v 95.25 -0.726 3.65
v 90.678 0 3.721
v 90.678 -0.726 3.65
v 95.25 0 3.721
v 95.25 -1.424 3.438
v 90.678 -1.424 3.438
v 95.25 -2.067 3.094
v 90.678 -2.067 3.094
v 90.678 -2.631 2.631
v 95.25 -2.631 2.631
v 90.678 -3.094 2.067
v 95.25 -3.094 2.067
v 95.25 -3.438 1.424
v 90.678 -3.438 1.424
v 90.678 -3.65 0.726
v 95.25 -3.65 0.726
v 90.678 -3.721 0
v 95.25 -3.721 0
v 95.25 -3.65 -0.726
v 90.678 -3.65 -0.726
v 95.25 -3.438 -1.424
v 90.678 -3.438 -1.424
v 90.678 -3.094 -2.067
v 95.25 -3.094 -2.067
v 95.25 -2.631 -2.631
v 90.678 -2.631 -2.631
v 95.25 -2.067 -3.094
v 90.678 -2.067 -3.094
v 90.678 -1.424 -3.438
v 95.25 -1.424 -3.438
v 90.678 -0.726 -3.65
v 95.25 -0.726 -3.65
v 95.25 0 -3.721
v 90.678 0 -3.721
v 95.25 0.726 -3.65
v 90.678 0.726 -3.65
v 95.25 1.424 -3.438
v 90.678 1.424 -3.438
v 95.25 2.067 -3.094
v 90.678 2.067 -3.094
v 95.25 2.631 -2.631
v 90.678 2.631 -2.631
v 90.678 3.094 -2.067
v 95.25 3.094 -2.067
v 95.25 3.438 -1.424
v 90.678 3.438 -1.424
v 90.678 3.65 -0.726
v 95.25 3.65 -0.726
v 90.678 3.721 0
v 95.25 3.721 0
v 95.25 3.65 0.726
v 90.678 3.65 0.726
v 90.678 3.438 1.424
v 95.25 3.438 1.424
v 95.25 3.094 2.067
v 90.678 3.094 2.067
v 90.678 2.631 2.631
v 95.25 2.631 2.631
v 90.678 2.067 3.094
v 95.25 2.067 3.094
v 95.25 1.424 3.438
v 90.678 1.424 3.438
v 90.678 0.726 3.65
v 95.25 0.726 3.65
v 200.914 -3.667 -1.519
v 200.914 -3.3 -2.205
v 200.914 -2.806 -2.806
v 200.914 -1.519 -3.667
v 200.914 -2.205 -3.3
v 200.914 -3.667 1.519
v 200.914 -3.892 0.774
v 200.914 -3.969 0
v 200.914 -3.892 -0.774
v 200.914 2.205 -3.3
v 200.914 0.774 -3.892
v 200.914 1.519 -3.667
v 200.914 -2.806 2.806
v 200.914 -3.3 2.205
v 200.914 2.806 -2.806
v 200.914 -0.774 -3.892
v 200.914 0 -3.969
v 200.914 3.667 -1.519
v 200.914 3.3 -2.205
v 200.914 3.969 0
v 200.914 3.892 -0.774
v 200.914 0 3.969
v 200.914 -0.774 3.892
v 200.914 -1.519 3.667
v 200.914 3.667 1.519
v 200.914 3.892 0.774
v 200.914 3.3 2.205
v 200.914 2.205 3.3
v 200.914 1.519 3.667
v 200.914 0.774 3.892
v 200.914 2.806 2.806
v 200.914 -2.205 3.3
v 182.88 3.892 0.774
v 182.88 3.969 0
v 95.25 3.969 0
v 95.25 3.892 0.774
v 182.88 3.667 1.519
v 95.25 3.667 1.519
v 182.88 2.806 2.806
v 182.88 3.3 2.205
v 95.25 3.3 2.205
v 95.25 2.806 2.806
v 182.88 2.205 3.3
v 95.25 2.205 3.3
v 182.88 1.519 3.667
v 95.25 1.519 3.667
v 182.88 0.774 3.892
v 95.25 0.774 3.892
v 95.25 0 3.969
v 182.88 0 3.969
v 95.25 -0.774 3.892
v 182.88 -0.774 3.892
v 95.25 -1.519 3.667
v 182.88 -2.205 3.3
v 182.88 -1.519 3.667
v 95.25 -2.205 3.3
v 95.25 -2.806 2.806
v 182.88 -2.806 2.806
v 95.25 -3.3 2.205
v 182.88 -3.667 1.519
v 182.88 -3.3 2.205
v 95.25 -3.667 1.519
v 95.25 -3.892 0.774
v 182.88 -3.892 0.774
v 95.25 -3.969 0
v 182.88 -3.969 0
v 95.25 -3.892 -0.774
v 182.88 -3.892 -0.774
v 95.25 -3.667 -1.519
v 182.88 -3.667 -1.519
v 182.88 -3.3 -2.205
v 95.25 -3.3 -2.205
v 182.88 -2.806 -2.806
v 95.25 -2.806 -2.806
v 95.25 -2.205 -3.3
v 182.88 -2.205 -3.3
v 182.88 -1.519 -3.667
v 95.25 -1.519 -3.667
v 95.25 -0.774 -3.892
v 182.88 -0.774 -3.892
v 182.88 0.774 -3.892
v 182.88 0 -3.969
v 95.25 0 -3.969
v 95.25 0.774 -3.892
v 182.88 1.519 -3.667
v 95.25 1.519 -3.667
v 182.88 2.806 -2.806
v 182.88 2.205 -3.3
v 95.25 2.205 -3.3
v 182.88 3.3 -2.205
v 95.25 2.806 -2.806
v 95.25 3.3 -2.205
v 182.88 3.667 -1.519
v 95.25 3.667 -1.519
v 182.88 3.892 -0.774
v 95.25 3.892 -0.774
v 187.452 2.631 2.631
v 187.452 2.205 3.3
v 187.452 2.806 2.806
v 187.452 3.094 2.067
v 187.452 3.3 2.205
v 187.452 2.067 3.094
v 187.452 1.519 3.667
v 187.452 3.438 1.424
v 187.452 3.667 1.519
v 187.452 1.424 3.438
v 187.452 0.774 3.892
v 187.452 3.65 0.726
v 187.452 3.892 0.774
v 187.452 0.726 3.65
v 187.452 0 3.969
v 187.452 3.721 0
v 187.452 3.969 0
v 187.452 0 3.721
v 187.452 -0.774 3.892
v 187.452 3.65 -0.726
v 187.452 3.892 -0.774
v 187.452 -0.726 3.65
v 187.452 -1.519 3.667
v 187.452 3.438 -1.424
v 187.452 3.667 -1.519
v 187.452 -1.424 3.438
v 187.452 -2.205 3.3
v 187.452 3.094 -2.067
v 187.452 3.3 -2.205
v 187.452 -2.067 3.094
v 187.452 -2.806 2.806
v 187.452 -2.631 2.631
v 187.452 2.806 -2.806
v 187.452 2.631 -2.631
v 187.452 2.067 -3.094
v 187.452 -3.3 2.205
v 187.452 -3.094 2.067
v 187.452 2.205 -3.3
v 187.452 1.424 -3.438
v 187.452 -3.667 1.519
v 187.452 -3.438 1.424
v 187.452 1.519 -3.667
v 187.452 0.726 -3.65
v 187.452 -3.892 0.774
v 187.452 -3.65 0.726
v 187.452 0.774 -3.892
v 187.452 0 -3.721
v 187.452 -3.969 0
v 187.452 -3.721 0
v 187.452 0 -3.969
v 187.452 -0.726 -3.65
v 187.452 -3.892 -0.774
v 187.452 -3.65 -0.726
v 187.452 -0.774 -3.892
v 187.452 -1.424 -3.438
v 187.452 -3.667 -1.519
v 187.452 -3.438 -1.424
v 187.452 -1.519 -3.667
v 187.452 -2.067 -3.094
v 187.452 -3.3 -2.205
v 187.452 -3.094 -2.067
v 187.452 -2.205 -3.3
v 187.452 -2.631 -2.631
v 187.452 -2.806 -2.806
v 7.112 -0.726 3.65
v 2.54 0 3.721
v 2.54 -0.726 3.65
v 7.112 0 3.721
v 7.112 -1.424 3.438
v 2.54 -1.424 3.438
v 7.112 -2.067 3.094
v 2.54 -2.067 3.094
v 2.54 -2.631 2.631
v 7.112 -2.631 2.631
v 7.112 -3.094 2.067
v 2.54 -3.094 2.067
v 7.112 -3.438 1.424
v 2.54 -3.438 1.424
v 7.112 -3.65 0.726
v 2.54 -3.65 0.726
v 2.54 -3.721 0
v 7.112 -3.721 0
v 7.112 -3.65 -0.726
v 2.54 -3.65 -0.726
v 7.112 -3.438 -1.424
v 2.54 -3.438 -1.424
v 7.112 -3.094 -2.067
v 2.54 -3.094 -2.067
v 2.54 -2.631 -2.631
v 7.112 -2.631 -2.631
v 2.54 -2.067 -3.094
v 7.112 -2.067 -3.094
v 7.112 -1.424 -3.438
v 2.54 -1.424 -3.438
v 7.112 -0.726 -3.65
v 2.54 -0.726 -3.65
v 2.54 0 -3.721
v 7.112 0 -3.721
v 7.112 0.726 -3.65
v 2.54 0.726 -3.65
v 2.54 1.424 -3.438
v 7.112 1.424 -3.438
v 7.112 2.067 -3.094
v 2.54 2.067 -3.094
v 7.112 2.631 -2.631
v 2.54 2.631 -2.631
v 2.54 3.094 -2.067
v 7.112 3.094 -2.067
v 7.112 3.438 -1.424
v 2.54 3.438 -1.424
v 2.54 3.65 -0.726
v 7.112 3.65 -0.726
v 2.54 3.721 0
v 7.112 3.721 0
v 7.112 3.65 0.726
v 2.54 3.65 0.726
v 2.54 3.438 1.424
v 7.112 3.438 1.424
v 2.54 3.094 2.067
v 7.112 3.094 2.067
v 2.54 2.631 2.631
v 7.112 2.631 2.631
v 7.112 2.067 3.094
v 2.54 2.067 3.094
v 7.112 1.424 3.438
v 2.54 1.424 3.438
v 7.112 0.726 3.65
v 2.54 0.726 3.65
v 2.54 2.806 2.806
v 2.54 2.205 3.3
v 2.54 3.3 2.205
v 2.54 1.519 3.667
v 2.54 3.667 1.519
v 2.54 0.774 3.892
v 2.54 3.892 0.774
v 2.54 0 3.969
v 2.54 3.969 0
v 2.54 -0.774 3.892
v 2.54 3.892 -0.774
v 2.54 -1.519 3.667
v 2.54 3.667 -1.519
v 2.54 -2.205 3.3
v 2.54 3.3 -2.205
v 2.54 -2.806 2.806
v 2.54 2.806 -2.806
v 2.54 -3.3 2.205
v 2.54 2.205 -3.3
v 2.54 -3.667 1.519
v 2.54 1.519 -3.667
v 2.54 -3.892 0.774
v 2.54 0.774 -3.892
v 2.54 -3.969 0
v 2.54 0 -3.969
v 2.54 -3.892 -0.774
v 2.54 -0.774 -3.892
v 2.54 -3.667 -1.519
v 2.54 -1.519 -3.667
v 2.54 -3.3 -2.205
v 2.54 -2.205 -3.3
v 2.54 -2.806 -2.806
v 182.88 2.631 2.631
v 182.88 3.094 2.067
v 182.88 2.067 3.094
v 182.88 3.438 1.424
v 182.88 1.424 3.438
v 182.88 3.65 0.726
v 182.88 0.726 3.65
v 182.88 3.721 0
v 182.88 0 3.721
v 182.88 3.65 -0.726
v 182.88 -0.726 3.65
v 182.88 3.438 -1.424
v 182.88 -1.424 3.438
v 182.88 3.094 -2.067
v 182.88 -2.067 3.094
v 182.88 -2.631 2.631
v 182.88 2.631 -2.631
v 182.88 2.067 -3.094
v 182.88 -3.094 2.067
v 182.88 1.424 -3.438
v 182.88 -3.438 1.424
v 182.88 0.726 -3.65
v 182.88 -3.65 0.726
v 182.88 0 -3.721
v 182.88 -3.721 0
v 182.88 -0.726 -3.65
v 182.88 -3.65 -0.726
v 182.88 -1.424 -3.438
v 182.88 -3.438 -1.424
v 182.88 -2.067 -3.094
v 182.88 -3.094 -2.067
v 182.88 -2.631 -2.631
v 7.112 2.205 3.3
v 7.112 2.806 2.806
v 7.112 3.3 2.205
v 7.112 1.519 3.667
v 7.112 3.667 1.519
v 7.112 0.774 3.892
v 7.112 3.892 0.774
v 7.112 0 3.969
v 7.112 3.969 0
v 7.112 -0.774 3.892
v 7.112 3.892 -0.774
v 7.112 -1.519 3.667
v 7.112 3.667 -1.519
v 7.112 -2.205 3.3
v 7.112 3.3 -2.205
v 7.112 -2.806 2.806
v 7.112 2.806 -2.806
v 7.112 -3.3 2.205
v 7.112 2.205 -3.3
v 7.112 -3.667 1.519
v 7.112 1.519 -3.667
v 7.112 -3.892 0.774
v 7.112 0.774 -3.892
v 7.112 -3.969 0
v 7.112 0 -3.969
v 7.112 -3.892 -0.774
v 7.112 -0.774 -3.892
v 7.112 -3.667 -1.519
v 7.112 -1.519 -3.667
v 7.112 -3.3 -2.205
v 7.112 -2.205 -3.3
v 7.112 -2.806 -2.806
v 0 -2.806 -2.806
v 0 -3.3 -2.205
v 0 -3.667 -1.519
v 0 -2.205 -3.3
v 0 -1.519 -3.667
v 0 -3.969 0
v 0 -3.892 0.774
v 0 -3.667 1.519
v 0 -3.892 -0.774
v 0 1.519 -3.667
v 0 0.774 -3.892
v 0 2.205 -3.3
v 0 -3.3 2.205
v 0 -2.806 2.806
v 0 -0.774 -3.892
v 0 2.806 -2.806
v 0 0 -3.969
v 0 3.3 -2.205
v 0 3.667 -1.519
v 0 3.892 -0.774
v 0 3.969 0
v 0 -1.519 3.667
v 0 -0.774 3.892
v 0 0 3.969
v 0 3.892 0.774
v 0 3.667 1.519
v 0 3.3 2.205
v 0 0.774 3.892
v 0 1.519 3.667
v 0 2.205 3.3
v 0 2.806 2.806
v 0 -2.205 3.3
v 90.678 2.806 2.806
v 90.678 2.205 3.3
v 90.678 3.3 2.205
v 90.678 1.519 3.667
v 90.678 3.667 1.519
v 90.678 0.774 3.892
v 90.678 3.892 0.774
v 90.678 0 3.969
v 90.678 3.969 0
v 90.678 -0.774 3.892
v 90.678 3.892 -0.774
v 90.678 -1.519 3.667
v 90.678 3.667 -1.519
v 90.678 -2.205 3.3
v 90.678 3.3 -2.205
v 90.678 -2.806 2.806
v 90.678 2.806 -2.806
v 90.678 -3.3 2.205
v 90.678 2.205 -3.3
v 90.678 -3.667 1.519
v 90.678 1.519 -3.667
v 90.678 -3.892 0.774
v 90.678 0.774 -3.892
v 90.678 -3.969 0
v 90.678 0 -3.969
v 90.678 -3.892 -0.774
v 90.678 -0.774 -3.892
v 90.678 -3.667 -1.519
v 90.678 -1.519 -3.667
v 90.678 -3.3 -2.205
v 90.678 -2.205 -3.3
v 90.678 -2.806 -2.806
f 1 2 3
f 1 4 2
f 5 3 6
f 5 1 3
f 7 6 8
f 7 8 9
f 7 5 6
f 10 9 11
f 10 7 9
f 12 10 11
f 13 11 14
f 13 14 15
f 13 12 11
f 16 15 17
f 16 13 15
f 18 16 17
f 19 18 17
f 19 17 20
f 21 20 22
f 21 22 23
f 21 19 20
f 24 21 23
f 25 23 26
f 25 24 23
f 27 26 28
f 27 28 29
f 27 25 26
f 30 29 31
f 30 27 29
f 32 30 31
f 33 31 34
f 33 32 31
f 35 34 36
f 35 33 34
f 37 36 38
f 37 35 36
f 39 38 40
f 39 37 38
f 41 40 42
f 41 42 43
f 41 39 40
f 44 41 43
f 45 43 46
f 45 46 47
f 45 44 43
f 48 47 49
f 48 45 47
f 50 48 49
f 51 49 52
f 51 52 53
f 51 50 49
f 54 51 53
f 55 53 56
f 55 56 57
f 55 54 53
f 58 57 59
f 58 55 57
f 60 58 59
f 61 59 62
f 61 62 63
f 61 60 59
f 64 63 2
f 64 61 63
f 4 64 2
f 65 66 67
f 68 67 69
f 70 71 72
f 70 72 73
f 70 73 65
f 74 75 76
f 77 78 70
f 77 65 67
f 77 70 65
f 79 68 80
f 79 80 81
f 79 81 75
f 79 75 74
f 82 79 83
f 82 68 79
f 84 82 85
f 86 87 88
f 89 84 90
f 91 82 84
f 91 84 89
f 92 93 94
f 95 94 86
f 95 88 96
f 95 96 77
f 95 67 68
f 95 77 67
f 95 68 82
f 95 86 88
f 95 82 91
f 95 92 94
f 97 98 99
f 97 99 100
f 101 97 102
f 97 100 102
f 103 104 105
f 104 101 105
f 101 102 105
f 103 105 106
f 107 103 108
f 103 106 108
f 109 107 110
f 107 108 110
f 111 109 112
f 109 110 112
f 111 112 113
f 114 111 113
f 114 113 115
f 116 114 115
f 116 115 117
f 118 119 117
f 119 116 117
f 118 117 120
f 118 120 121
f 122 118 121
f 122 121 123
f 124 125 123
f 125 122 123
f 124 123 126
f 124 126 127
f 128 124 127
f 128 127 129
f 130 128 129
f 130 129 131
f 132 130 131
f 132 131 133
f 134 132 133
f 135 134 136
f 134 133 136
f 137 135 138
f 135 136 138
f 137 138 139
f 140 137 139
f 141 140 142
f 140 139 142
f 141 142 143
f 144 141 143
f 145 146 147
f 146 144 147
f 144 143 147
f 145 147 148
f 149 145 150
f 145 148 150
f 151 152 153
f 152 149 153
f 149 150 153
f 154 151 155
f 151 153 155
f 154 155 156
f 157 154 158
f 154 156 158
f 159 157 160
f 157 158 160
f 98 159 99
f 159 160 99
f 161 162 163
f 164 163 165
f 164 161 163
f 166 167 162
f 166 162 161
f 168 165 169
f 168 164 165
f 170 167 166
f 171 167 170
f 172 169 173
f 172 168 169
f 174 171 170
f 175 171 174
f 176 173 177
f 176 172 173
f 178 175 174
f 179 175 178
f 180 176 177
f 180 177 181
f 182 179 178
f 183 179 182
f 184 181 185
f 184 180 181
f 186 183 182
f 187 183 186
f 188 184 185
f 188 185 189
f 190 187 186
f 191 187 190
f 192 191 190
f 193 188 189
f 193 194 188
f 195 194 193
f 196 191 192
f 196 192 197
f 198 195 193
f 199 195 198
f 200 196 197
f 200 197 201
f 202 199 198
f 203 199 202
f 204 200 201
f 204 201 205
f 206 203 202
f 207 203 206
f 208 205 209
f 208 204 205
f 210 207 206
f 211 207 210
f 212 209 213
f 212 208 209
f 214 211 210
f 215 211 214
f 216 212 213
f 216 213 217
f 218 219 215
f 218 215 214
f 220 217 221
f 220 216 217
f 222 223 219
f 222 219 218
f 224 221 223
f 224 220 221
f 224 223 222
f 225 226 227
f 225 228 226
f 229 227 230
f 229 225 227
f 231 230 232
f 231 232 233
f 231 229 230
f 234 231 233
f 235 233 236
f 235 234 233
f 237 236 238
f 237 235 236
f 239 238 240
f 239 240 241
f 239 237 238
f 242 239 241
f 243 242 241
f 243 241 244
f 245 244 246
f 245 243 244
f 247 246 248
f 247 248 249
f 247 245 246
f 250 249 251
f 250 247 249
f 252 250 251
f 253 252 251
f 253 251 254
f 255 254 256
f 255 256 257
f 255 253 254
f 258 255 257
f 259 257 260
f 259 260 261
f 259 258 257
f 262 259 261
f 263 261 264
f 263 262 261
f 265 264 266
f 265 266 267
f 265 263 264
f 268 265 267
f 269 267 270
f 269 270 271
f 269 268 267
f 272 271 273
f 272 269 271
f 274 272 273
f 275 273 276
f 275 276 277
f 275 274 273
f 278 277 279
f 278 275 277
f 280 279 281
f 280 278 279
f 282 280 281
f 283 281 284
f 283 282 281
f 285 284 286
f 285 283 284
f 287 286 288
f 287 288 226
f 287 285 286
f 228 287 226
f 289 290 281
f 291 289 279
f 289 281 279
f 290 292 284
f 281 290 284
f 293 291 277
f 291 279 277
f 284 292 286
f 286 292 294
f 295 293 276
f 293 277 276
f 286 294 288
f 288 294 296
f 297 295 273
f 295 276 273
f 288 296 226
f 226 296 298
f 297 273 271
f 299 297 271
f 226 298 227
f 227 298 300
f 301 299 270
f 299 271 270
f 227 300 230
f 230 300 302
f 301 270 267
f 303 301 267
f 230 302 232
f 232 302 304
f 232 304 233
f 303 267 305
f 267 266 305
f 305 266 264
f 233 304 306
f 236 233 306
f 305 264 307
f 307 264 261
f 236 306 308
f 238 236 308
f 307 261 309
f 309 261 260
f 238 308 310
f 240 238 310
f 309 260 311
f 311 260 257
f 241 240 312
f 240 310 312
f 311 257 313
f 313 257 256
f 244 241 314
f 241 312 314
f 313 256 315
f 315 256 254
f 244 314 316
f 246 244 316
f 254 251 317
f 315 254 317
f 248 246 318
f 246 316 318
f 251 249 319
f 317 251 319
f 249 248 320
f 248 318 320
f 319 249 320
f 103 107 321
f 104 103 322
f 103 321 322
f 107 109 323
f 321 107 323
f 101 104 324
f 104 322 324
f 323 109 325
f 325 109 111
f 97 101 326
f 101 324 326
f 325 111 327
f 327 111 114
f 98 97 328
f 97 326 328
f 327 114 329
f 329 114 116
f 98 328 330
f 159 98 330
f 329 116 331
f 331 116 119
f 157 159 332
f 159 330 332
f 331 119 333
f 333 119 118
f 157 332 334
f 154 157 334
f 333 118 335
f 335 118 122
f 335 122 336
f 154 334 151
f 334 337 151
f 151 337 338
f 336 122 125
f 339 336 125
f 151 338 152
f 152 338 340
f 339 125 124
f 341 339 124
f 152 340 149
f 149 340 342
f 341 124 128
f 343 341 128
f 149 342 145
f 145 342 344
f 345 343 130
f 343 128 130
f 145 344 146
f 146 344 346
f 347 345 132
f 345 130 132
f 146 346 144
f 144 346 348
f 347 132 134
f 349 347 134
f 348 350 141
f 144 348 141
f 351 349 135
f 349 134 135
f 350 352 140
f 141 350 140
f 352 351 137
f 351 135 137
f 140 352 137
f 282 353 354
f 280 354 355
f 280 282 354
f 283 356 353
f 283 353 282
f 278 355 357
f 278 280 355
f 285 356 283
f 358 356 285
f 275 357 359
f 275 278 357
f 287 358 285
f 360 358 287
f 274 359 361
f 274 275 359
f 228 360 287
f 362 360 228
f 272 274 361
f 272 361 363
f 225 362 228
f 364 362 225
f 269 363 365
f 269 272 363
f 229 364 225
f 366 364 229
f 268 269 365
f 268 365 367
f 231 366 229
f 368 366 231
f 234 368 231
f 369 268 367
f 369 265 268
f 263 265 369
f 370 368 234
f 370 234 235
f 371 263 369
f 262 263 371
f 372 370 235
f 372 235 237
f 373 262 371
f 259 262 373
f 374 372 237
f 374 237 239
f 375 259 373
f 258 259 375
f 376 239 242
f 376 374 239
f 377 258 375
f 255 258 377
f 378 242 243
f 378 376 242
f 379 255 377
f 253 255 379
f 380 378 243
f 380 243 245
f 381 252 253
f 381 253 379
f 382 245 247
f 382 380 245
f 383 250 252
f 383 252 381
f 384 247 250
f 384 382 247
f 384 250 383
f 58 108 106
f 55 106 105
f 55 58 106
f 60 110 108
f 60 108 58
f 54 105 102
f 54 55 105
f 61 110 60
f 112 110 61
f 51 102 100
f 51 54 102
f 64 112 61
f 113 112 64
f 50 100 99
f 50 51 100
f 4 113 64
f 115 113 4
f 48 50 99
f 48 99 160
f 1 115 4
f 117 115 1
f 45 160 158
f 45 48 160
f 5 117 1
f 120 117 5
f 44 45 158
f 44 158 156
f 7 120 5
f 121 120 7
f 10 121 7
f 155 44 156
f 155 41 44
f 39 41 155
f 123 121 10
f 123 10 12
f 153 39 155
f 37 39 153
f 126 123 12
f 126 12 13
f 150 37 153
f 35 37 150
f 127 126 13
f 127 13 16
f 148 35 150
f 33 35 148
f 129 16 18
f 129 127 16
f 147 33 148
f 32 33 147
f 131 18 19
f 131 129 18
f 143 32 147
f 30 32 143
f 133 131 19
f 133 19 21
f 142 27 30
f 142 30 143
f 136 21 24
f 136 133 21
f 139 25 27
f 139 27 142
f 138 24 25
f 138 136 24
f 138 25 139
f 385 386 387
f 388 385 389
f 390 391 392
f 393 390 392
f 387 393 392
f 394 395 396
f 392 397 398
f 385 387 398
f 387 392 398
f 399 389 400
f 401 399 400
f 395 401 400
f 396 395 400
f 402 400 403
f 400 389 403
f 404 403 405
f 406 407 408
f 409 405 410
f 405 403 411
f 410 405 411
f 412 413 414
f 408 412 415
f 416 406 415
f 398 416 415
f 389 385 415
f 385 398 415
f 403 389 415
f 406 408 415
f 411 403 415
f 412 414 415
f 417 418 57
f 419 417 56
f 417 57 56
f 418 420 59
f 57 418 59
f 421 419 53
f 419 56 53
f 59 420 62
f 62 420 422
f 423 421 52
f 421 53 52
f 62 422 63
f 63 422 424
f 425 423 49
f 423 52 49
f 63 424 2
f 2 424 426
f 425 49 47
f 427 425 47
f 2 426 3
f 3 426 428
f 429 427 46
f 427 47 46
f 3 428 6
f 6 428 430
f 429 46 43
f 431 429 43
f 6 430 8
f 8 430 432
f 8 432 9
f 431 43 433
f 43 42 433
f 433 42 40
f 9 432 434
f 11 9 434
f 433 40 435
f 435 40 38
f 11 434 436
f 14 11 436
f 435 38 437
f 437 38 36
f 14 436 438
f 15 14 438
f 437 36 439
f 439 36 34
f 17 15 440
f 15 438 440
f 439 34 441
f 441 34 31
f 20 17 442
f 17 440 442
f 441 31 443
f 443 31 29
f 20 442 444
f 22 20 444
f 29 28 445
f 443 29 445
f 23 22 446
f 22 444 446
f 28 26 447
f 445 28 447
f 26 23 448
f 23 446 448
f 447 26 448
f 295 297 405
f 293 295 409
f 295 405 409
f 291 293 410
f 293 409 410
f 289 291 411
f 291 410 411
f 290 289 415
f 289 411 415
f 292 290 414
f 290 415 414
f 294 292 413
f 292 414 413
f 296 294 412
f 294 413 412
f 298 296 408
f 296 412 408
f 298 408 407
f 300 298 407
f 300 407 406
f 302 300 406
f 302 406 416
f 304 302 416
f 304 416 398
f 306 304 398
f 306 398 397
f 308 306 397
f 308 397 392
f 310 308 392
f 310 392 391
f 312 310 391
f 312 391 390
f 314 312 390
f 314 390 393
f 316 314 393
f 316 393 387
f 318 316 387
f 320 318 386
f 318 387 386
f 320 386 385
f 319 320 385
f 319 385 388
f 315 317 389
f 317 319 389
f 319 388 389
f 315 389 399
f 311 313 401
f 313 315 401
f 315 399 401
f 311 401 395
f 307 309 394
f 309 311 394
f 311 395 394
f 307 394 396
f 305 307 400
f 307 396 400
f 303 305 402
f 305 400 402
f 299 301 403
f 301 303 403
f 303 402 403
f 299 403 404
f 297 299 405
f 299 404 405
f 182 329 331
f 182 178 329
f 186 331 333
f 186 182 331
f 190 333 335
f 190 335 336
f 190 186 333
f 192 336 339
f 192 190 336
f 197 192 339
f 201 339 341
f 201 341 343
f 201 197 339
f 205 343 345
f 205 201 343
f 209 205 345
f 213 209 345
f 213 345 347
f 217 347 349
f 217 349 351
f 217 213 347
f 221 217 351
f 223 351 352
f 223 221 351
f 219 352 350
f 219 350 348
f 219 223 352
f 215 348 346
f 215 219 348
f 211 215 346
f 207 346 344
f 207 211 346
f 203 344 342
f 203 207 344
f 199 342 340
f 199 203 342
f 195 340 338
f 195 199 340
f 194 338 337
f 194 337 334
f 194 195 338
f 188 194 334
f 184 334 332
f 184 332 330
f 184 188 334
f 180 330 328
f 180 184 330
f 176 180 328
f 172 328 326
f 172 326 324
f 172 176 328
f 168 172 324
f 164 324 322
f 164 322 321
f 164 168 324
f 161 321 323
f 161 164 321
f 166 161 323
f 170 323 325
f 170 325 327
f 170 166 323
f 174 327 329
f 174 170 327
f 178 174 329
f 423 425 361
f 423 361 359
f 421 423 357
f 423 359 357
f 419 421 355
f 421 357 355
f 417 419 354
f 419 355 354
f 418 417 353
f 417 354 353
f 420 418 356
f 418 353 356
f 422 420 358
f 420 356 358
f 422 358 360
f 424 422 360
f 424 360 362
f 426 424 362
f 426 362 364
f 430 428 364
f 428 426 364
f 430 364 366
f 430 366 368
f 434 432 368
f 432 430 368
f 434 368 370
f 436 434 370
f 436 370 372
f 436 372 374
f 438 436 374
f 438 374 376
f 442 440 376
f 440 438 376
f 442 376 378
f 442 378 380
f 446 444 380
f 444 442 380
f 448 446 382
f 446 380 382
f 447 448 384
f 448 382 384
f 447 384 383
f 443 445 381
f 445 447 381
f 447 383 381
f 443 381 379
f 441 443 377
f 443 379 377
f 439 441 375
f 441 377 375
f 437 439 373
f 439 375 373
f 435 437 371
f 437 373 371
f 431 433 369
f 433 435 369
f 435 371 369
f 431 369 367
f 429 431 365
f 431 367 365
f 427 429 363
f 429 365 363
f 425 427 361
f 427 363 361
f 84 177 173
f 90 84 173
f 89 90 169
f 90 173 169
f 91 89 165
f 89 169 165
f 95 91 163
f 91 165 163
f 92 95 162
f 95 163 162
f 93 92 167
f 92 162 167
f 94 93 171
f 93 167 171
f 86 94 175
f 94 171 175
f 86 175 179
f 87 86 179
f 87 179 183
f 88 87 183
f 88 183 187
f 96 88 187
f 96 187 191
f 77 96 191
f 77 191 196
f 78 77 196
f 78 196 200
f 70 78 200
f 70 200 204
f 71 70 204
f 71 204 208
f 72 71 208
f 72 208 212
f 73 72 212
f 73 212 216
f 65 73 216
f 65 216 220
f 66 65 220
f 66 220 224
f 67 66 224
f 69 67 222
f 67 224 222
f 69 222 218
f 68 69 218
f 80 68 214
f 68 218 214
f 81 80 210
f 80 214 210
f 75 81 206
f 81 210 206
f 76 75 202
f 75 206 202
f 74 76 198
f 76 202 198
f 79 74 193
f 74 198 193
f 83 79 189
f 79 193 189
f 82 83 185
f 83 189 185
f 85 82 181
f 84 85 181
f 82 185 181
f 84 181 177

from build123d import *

# Parameters (mm, degrees)
F0_R     = 3.96875
F1_DEPTH = 200.914
F2_W     = 4.572
F2_H     = 0.24765


with BuildPart() as f1:
    # F0 (on Right) → F1 (new body)
    with BuildSketch(Plane.YZ):
        Circle(F0_R)
    extrude(amount=F1_DEPTH)

    # F2 (on Front) → F3 (revolve, cut)
    with BuildSketch(Plane.XZ):
        with Locations((185.166, 3.844925)):
            Rectangle(F2_W, F2_H)
        with Locations((92.964, 3.844925)):
            Rectangle(F2_W, F2_H)
        with Locations((4.826, 3.844925)):
            Rectangle(F2_W, F2_H)
    revolve(axis=Axis((98.498309, 0, 0), (1, 0, 0)), mode=Mode.SUBTRACT)


solid = f1.part
